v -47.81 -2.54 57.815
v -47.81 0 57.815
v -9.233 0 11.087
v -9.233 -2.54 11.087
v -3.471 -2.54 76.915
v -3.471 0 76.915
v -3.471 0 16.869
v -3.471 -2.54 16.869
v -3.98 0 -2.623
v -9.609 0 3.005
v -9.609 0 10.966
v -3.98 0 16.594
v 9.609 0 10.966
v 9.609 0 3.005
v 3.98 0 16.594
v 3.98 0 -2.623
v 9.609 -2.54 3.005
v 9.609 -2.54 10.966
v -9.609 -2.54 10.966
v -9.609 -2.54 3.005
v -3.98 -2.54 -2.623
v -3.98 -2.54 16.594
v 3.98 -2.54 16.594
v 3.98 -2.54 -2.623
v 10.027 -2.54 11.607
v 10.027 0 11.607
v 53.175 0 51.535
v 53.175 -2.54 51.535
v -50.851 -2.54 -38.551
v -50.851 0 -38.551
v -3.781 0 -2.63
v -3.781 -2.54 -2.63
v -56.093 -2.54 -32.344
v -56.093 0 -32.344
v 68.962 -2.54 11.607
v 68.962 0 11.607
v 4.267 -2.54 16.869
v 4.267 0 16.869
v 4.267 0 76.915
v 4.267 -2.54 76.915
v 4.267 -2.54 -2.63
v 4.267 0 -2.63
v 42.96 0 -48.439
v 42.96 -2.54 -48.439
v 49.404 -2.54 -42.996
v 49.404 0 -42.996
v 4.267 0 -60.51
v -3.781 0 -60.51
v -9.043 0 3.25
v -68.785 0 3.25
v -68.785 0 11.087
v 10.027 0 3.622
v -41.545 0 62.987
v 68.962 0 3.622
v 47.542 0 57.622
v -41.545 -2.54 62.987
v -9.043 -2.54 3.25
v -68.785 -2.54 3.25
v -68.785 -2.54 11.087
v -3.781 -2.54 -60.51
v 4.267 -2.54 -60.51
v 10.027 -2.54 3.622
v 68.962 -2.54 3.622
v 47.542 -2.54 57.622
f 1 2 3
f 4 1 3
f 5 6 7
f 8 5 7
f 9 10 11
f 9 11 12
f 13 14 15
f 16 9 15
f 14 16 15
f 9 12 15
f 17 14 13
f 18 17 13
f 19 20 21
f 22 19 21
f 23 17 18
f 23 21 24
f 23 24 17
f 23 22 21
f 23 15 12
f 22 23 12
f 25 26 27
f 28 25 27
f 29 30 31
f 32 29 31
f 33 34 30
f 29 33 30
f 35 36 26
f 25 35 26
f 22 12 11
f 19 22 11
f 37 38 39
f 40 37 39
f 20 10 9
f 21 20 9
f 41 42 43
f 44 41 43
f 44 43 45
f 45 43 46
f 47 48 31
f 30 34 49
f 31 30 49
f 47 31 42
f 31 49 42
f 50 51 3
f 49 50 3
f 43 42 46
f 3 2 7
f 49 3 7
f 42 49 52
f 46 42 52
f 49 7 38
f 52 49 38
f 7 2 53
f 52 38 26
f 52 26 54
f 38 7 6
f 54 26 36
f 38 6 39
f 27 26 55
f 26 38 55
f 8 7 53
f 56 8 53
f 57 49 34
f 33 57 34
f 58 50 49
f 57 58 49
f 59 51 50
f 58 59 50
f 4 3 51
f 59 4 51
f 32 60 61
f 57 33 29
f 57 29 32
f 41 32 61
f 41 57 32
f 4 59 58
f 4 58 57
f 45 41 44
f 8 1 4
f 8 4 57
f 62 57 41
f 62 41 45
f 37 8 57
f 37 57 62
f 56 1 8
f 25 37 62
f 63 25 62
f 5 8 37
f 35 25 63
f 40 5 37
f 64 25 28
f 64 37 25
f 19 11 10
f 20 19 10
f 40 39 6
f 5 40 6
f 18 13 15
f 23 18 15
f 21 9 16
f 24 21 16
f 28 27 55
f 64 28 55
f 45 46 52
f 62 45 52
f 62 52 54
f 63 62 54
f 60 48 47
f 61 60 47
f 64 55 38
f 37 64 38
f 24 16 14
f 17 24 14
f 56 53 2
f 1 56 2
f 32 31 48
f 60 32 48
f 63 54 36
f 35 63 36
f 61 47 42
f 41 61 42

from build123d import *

# Parameters (mm, degrees)
F2_DEPTH = 2.54


with BuildPart() as f2:
    # F0 (on Front) → F2 (new body)
    with BuildSketch(Plane.XZ):
        Polygon((9.6088054153, 3.0054593734), (9.6088054153, 10.9656544158), (3.9800975212, 16.5943623099), (-3.9800975212, 16.5943623099), (-9.6088054153, 10.9656544158), (-9.6088054153, 3.0054593734), (-3.9800975212, -2.6232485207), (3.9800975212, -2.6232485207), align=None)
    extrude(amount=F2_DEPTH)


with BuildPart() as f2b:
    # F1 (on face) → F2, piece 2 (new body)
    with BuildSketch(Plane.XZ):
        Polygon((47.5419638027, 57.6224601616), (4.267366603, 16.8691836298), (4.267366603, 76.9153758883), (-3.471189877, 76.9153758883), (-3.471189877, 16.8691836298), (-41.5448844433, 62.9871338606), (-47.8097613253, 57.8150260868), (-9.2326552678, 11.0873029835), (-68.7846019864, 11.0873029835), (-68.7846019864, 3.2504596747), (-9.0429484844, 3.2504596747), (-56.093364954, -32.3439314961), (-50.8506766513, -38.5507576875), (-3.7807321642, -2.6303527411), (-3.7807321642, -60.5099275708), (4.2673670687, -60.5099275708), (4.2673670687, -2.6303527411), (42.9601445794, -48.4387874603), (49.403856578, -42.9960100279), (10.0268791084, 3.6224500028), (68.961687386, 3.6224500028), (68.961687386, 11.6074029356), (10.0268791084, 11.6074029356), (53.1750358641, 51.5350289643), align=None)
    extrude(amount=F2_DEPTH)


solid = Compound([f2.part, f2b.part])
